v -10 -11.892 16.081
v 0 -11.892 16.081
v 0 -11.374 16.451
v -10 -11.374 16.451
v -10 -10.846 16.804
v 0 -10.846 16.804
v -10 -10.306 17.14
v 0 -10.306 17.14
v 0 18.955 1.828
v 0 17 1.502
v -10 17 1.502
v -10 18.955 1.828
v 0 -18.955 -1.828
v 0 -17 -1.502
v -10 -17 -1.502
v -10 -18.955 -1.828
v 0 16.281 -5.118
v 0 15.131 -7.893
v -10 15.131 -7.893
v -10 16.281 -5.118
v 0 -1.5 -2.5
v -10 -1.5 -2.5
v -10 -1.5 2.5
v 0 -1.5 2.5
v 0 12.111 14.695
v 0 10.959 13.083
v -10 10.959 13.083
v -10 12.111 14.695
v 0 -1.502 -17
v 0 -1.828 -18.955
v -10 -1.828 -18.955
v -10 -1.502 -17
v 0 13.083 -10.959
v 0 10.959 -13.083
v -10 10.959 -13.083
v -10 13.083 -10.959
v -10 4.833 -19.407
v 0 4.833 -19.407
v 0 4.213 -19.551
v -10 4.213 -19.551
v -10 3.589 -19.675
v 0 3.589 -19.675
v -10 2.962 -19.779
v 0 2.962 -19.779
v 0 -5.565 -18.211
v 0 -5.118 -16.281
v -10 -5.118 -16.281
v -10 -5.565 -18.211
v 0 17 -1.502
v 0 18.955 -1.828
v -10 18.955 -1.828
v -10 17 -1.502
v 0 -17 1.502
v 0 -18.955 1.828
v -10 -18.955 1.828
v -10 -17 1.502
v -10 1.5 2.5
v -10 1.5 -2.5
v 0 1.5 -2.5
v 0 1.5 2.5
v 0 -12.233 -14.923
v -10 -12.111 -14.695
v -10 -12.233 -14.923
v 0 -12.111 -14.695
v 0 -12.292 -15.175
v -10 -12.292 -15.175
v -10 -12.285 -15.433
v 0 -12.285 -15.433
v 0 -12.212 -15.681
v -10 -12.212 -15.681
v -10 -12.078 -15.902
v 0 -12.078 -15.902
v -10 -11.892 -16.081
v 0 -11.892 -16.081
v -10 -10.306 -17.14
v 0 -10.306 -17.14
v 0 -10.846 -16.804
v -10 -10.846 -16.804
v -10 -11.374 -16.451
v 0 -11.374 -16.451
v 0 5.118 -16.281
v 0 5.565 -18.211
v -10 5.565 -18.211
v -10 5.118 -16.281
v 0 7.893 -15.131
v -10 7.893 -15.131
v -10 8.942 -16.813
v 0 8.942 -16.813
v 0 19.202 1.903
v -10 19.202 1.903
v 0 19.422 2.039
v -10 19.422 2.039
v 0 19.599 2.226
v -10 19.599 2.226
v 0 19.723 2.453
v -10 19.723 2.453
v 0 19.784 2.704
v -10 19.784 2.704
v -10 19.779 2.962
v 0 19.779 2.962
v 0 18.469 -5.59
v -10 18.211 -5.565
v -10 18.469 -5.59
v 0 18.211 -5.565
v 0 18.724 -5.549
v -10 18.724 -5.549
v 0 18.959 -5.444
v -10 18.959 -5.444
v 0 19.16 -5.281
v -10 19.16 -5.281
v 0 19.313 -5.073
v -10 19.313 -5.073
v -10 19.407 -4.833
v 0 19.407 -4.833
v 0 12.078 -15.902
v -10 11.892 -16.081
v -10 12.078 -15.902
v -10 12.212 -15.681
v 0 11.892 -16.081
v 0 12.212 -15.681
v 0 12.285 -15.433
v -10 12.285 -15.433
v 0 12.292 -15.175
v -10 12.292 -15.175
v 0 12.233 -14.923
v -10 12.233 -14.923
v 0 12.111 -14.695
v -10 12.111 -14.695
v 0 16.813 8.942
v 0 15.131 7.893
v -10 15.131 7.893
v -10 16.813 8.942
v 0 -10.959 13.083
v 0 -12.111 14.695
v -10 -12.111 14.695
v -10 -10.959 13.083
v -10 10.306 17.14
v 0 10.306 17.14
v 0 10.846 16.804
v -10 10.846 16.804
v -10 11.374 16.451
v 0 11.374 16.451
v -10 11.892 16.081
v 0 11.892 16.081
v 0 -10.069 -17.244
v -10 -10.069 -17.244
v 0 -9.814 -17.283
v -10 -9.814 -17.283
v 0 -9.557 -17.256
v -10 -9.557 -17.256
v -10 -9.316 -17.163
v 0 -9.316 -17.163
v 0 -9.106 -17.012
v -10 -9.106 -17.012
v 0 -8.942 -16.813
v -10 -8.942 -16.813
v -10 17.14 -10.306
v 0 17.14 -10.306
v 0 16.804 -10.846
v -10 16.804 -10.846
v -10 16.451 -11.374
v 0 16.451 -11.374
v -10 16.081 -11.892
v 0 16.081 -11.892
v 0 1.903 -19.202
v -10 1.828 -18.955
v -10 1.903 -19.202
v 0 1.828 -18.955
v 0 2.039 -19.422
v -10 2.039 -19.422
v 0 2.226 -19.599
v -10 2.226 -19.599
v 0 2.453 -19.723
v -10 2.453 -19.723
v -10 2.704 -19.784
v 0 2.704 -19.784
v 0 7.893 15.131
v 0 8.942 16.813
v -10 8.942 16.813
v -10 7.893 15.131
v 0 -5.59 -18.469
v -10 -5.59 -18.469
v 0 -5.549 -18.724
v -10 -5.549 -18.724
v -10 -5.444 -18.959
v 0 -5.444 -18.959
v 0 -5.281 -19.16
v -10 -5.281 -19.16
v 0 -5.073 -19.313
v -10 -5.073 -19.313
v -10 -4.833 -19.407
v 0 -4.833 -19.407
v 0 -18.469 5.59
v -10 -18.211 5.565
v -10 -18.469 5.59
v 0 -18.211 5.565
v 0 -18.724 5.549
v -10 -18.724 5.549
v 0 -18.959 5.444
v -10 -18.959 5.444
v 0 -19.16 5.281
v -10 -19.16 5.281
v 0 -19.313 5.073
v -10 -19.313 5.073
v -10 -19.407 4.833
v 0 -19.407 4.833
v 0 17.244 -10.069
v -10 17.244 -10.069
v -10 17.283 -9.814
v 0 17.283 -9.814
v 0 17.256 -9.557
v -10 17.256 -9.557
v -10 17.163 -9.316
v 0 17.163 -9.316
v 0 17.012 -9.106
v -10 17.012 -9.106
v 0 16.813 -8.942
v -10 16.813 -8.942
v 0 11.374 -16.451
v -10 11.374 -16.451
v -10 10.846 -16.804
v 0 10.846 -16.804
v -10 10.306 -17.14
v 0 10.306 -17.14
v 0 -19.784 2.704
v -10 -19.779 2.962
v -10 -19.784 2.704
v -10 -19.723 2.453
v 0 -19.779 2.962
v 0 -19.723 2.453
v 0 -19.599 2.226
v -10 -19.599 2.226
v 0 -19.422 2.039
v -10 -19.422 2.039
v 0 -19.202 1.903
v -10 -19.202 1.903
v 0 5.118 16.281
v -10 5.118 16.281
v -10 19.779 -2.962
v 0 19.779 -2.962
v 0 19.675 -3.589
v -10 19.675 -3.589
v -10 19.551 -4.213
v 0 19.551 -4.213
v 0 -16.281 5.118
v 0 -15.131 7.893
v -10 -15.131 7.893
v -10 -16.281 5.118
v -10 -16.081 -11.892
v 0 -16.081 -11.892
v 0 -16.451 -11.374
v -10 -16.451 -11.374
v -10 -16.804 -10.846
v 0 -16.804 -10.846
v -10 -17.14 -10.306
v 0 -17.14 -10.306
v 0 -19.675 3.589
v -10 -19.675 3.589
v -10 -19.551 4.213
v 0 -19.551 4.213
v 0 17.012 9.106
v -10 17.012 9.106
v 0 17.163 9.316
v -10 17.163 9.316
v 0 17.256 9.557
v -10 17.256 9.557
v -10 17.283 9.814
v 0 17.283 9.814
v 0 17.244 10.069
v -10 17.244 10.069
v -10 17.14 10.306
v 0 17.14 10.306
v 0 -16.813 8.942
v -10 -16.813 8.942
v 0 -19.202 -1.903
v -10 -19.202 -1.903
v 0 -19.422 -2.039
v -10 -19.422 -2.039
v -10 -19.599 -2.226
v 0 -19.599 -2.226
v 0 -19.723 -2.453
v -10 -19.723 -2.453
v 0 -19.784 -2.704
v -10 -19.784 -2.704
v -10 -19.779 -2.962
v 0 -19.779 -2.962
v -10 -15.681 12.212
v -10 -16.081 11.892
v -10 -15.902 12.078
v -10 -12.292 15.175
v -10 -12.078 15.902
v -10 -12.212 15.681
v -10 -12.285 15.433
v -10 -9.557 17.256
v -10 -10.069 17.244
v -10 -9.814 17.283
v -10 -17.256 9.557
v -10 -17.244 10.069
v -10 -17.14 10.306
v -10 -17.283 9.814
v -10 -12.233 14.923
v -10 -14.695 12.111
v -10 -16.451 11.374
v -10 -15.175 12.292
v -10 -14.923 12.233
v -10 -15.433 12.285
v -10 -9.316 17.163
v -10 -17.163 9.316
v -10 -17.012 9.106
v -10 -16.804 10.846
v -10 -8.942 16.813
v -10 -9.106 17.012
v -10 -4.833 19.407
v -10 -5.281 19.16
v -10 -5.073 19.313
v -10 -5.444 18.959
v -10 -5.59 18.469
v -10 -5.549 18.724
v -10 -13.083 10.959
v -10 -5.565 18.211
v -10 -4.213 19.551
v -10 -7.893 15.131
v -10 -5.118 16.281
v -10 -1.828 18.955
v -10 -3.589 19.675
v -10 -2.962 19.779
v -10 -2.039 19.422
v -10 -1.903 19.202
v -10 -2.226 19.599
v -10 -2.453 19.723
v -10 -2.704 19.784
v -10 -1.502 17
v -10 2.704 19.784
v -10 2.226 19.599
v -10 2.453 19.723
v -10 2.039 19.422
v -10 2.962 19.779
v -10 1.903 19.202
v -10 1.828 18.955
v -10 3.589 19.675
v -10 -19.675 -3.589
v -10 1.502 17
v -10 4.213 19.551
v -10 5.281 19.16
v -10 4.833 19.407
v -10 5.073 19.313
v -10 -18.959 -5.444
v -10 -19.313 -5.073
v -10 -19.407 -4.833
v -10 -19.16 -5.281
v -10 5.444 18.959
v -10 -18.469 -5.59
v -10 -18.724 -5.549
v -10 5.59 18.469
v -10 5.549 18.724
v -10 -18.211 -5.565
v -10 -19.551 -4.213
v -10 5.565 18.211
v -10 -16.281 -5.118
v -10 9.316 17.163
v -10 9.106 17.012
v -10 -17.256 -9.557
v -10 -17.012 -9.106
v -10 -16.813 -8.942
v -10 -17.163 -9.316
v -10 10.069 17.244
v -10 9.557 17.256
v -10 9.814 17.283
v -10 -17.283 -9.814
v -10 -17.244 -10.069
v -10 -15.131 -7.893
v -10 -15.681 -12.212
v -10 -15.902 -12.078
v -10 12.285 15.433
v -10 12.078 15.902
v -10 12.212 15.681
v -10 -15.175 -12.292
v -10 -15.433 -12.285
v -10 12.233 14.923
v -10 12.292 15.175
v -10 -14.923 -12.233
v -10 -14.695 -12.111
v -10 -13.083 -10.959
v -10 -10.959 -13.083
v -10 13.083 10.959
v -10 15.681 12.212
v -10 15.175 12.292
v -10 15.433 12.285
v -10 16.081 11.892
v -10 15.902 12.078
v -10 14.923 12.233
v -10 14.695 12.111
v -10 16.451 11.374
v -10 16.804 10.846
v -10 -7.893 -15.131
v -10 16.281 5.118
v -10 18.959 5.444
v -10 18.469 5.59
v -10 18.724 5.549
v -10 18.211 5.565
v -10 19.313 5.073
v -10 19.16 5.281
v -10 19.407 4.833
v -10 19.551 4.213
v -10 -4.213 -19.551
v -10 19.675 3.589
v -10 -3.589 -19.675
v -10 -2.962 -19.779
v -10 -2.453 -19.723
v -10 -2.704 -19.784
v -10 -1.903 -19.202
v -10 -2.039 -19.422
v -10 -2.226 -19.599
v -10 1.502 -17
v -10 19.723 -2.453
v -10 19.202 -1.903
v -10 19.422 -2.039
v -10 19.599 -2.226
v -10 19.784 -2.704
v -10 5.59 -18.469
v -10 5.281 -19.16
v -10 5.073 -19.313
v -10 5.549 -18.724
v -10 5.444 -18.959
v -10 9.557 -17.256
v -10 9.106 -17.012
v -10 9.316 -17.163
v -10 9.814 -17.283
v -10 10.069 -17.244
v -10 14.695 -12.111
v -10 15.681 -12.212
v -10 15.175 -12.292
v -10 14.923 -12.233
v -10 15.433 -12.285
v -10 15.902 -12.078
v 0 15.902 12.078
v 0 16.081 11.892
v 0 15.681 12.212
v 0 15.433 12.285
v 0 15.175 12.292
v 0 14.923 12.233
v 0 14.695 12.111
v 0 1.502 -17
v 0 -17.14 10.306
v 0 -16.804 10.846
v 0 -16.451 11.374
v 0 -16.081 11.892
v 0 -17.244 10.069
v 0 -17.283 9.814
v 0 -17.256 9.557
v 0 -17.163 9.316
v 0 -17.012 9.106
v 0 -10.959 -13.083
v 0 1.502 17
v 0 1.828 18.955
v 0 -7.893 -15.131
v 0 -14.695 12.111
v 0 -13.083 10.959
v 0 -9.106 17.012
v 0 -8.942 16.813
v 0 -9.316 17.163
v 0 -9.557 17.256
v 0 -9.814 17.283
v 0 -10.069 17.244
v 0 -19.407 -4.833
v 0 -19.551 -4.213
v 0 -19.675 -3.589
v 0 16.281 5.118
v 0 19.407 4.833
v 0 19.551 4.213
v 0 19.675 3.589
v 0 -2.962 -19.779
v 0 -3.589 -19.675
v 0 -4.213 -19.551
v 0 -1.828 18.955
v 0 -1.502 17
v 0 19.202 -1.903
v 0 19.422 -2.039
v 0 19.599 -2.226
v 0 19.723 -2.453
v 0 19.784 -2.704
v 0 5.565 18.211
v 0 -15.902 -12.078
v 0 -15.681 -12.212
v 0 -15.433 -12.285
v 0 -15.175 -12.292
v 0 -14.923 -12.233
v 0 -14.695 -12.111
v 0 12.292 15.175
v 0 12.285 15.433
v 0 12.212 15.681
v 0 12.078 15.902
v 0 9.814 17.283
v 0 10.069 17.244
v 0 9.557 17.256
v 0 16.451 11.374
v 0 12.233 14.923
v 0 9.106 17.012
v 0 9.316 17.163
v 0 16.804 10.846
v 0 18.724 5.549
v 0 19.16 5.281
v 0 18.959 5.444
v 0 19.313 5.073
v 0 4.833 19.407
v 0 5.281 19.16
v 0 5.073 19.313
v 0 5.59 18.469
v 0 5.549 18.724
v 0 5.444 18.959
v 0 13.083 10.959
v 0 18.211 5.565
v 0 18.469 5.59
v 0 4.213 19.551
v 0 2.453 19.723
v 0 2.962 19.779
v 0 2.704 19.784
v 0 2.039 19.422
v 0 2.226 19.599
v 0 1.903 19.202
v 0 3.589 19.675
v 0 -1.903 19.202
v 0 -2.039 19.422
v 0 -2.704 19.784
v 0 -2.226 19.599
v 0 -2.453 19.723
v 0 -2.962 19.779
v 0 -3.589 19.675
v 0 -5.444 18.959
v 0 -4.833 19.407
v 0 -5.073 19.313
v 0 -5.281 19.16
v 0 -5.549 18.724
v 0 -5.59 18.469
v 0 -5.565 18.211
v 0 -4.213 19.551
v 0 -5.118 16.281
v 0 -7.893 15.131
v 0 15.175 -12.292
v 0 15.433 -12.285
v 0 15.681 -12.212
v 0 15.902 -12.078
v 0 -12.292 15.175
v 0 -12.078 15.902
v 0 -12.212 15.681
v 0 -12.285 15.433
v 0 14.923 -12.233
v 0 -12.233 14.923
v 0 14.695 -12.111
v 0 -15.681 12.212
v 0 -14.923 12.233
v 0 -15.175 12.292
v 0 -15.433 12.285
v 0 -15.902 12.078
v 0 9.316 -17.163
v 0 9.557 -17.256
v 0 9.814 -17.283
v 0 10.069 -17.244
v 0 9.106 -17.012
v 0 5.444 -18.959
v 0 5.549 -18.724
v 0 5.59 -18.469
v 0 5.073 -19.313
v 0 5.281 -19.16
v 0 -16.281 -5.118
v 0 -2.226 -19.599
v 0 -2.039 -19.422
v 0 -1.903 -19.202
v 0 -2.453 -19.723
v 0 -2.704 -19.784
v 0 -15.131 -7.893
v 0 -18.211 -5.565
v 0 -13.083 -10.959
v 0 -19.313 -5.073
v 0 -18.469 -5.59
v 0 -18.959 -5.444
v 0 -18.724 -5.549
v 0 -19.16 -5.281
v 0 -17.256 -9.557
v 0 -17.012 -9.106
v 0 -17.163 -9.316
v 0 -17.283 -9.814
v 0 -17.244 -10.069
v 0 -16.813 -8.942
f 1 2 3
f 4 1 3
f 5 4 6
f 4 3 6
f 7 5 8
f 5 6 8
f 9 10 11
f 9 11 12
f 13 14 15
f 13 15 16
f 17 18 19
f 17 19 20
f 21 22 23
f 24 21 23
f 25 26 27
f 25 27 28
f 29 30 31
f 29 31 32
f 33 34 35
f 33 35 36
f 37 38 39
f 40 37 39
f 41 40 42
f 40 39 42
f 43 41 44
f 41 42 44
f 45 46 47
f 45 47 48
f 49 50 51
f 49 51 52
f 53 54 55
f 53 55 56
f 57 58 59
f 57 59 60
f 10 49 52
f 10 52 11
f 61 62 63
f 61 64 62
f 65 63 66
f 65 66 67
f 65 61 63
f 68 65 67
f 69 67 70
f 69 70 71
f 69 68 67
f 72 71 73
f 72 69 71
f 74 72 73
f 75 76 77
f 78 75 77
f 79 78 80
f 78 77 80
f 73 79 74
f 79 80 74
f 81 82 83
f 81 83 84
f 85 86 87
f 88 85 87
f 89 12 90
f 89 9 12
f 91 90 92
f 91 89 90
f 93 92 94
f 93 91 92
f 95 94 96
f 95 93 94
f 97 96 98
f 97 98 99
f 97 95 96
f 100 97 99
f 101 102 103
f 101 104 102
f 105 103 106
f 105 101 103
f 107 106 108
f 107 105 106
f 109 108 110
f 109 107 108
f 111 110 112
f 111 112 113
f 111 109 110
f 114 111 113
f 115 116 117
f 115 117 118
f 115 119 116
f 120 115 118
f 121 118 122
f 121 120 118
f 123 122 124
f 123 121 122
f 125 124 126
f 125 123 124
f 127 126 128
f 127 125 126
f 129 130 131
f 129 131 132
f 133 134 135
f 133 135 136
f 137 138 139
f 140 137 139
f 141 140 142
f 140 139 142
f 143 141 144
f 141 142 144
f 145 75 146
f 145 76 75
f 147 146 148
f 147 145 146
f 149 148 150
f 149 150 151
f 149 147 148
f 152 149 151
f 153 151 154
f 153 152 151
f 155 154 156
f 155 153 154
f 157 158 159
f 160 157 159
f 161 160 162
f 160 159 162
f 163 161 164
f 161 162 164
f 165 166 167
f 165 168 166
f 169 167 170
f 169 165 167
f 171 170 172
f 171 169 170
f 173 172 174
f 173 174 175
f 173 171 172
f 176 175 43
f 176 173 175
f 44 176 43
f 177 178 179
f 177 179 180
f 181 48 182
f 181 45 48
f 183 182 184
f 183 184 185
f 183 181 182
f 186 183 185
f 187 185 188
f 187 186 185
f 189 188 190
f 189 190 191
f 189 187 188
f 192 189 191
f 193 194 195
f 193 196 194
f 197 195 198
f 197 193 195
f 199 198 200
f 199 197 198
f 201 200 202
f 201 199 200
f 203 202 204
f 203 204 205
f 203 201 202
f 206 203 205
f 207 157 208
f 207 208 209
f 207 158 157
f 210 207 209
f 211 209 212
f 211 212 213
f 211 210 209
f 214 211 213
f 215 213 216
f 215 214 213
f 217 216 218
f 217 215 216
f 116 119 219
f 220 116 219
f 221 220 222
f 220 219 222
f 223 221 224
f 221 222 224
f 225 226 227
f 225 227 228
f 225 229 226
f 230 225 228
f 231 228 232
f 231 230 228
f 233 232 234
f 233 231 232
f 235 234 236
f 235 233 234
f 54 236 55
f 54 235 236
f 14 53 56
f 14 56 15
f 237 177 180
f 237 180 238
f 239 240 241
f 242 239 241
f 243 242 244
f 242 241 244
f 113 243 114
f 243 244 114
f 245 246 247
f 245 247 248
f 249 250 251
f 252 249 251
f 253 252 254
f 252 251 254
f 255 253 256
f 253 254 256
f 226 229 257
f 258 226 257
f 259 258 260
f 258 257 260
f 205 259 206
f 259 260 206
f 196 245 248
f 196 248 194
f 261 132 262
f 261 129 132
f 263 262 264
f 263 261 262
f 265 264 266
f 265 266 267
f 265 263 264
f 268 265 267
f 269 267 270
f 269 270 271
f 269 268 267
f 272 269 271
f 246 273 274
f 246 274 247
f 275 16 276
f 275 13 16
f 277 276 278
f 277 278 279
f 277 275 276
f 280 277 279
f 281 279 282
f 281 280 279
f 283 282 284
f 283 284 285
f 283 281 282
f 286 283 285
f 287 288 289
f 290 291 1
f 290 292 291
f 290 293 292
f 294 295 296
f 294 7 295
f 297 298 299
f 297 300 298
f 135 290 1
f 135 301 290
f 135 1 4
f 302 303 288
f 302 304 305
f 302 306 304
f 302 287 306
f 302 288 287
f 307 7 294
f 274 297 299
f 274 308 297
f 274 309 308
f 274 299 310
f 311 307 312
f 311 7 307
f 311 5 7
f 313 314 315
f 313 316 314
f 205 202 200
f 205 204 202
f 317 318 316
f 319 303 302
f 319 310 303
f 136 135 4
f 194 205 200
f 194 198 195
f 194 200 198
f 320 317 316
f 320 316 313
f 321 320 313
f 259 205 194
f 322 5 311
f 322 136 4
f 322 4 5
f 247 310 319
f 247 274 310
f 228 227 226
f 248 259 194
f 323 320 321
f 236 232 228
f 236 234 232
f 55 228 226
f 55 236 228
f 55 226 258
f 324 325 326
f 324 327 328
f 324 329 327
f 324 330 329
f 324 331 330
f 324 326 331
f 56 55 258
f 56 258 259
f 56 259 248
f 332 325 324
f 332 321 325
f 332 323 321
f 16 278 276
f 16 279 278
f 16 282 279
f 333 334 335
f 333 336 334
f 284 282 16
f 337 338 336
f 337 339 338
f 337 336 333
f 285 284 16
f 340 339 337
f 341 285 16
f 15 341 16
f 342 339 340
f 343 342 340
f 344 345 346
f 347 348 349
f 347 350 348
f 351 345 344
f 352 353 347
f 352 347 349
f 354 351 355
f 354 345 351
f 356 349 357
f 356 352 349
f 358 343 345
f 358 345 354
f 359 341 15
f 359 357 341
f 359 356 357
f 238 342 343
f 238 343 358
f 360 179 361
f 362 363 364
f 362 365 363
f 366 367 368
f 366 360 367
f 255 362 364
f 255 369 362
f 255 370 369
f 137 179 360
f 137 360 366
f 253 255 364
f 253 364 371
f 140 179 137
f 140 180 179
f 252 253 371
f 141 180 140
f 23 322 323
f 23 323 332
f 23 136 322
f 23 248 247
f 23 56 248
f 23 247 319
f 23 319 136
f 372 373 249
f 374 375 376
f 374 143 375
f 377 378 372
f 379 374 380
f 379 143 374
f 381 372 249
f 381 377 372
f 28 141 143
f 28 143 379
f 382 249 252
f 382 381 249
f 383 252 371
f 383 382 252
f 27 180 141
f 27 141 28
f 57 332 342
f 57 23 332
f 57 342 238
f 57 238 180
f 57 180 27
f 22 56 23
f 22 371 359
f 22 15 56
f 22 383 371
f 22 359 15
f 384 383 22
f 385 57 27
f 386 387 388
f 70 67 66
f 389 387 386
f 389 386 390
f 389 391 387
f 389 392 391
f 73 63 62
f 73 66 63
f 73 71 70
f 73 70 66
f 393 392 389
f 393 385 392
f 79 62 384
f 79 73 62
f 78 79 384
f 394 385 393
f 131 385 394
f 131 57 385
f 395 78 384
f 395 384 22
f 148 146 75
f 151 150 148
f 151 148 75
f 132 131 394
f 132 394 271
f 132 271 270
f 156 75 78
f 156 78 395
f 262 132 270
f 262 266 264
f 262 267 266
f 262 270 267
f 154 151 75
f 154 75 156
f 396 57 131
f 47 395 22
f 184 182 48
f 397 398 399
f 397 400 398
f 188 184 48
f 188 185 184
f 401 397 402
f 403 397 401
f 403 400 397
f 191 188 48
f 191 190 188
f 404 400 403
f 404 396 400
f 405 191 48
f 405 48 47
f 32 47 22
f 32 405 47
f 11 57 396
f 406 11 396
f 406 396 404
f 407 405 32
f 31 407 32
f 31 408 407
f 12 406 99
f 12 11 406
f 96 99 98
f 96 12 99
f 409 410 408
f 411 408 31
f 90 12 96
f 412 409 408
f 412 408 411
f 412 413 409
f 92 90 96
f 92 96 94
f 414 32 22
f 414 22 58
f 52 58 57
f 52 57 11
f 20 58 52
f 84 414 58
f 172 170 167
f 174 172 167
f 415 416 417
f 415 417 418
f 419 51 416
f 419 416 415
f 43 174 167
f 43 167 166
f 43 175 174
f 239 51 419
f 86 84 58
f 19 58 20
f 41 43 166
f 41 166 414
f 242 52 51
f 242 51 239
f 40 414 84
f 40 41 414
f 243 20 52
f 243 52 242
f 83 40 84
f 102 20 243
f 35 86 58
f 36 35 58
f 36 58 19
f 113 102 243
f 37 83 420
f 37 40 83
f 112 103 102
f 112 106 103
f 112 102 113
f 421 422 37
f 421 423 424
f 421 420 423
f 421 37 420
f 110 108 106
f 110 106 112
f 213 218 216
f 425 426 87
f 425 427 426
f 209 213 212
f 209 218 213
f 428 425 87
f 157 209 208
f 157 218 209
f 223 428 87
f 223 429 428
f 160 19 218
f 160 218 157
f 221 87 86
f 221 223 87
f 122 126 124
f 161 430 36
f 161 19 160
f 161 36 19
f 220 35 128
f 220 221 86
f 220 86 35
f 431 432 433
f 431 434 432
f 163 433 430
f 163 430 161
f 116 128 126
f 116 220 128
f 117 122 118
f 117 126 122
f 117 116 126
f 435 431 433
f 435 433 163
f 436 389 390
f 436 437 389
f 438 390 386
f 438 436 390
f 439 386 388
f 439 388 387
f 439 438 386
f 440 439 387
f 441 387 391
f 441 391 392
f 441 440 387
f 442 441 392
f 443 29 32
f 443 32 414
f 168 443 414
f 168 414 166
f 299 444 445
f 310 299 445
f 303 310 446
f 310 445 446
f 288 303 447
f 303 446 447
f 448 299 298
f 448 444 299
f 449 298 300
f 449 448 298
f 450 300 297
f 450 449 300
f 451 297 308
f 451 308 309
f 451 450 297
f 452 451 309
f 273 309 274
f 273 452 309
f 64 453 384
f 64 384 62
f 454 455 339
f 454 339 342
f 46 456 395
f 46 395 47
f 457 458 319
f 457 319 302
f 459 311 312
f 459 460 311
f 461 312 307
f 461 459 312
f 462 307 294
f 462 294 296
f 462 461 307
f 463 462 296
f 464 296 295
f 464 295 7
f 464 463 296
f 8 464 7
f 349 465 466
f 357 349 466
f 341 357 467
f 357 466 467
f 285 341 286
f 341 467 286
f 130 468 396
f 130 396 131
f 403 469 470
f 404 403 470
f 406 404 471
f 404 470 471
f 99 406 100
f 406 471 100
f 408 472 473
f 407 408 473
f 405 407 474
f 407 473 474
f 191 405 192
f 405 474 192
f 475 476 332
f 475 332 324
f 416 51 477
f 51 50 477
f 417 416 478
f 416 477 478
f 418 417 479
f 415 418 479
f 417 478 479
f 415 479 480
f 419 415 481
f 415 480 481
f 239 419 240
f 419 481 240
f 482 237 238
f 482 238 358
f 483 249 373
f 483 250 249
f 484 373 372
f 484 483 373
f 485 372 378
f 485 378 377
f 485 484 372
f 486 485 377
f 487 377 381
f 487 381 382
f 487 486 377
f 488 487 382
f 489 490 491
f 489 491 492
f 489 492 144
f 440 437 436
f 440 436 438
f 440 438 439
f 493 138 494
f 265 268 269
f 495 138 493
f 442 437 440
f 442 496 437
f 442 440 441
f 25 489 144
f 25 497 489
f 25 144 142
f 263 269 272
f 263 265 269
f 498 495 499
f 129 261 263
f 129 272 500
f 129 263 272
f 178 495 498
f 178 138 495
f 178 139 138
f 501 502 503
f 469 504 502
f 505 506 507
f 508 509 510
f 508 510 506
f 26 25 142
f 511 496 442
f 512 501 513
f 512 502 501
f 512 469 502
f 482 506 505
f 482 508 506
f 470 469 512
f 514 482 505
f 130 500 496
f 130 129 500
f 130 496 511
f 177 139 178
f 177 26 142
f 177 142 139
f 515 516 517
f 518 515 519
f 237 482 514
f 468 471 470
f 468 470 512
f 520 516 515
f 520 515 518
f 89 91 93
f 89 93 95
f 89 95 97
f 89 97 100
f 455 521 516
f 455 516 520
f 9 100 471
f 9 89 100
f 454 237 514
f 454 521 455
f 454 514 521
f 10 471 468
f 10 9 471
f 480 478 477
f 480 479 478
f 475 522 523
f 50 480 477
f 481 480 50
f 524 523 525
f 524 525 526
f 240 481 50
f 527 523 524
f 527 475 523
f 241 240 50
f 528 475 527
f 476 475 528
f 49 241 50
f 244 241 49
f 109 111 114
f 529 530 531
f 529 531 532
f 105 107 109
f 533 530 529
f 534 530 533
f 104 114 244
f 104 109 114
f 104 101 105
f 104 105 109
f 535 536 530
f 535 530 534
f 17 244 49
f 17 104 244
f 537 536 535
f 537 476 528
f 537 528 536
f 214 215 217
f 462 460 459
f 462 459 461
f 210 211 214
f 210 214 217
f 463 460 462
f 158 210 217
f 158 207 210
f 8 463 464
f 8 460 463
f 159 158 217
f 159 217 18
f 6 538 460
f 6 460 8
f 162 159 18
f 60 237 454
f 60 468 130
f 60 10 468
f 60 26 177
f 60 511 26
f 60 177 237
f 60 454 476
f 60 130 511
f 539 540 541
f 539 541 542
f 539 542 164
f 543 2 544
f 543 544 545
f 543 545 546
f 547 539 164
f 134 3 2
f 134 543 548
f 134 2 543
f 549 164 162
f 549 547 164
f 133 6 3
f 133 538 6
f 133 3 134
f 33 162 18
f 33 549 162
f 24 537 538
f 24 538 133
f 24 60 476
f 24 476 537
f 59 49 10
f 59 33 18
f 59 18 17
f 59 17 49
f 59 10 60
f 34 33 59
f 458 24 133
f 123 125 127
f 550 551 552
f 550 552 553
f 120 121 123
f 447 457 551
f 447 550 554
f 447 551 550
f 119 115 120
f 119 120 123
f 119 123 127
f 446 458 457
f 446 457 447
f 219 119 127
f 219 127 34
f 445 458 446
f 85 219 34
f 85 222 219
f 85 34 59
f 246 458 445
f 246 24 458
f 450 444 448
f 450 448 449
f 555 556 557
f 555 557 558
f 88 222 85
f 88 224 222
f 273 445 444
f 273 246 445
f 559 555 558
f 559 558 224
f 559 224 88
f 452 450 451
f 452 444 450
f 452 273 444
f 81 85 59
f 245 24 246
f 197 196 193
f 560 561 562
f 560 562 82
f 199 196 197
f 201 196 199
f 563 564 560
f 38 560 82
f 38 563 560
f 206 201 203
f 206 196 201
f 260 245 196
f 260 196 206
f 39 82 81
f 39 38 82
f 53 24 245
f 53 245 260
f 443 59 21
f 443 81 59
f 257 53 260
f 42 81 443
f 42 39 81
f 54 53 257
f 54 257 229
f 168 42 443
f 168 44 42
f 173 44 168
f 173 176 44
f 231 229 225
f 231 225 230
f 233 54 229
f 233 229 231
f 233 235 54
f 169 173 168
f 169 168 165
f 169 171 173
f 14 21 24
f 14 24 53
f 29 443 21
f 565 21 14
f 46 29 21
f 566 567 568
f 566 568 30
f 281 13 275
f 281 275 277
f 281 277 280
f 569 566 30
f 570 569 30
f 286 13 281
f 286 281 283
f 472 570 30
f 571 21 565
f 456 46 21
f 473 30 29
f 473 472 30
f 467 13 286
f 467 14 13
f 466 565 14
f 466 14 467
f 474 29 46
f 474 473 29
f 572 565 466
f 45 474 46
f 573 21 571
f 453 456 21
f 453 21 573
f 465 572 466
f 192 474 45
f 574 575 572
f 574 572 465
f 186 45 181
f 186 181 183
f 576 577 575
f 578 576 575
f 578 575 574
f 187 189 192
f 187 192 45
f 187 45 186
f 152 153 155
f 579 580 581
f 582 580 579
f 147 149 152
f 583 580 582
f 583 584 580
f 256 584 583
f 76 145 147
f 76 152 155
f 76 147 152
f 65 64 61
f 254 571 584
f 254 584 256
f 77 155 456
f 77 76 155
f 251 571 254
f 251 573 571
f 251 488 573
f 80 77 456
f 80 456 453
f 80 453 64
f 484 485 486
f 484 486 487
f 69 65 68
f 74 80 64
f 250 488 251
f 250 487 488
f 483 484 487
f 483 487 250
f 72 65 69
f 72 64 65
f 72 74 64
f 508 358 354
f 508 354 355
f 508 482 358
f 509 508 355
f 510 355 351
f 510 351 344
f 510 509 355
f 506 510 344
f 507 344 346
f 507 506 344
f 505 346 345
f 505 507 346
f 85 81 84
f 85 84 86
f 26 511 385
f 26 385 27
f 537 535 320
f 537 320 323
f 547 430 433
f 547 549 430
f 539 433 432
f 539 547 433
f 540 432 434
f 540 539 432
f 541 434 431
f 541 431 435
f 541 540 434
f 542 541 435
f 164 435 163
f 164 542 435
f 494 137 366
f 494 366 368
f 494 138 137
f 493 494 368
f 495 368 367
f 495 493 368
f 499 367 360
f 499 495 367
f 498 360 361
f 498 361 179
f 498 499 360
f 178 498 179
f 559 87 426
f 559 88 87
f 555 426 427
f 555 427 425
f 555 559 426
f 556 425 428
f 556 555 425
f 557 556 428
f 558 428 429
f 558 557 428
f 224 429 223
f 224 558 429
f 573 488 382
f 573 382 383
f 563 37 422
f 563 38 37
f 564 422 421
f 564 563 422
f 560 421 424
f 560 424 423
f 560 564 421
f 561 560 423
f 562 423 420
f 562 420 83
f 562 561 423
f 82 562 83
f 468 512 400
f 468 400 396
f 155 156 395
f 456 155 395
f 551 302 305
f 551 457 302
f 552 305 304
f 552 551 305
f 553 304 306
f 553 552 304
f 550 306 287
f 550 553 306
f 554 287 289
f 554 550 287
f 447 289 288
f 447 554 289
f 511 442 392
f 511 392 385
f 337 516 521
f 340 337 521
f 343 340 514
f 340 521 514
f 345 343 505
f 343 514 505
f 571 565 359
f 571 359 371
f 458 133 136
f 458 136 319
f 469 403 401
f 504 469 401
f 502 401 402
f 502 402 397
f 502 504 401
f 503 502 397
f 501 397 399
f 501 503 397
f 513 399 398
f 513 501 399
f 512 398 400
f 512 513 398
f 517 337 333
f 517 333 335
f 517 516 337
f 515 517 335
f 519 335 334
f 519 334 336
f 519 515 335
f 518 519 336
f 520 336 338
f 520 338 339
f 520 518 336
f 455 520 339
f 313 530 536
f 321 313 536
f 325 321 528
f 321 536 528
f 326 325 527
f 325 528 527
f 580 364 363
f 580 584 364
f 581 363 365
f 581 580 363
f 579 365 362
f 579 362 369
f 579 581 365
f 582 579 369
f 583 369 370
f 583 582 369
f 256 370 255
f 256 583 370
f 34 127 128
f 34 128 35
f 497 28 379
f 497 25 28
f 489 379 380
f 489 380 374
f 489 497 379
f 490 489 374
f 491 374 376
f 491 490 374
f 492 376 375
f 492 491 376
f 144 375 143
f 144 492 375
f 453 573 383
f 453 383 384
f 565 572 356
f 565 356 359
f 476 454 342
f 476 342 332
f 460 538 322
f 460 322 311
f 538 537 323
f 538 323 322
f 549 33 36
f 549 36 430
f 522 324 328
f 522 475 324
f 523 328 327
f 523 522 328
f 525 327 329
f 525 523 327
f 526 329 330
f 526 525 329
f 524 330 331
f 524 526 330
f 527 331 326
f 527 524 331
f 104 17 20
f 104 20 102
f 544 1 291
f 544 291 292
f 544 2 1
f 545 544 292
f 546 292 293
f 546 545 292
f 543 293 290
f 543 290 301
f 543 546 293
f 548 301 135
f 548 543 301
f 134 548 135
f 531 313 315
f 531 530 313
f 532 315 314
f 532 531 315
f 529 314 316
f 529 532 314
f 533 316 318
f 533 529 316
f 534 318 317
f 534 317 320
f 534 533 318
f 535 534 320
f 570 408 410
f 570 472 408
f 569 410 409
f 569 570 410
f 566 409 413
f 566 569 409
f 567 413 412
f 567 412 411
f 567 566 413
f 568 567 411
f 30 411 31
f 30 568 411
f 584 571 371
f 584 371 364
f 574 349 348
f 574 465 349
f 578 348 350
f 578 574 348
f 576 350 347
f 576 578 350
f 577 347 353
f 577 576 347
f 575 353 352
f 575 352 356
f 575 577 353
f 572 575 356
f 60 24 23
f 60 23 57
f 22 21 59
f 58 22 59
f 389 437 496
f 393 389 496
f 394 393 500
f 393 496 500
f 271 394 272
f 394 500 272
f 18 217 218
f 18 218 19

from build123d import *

# Parameters (mm, degrees)
SKETCH4_W                = 5
SKETCH4_H                = 3
CUT_EXTRUDE2_DEPTH       = 10
CUT_EXTRUDE3_DEPTH       = 10
FILLET1_R                = 1
CIRPATTERN1_COUNT        = 16
FILLET1_OF_CIRPATTERN1_R = 1


with BuildPart() as part:
    # Sketch1 → Revolve1 (revolve)
    with BuildSketch(Plane.XY):
        Polygon((0, 0), (-10, 0), (-10, 5), (-10, 10), (-10, 20), (0, 20), (0, 5), align=None)
    revolve(axis=Axis((0, 0, 0), (-1, 0, 0)))

    # Sketch4 → Cut-Extrude2 (cut)
    with BuildSketch(Plane.ZY.offset(10)):
        Rectangle(SKETCH4_W, SKETCH4_H)
    extrude(amount=-CUT_EXTRUDE2_DEPTH, mode=Mode.SUBTRACT)

    # Sketch5 → Cut-Extrude3 (cut)
    with BuildSketch(Plane(origin=(0, 0, 0), x_dir=(0, 0, -1), z_dir=(1, 0, 0))):
        Polygon((-2.502016427, 23), (2.502016427, 23), (1.501758676, 17), (-1.501758676, 17), align=None)
    cut_extrude3 = extrude(amount=-CUT_EXTRUDE3_DEPTH, mode=Mode.SUBTRACT)

    # Fillet1
    fillet1_edges = [part.edges().sort_by_distance(p)[0] for p in [
        (-5, 19.90120888, -1.985418121),
        (-5, 19.90120888, 1.985418121),
    ]]
    fillet(fillet1_edges, radius=FILLET1_R)

    # CirPattern1: Cut-Extrude3 ×16 about axis
    cirpattern1_axis = Axis((0, 0, 0), (1, 0, 0))
    for i in range(1, CIRPATTERN1_COUNT):
        add(cut_extrude3.rotate(cirpattern1_axis, i * 360 / CIRPATTERN1_COUNT), mode=Mode.SUBTRACT)

    # Fillet1 of CirPattern1
    fillet1_of_cirpattern1_edges = [part.edges().sort_by_distance(p)[0] for p in [
        (-5, 19.146106178, 5.781575757),
        (-5, 17.626532935, 9.450150088),
        (-5, 15.47618237, 12.668377136),
        (-5, 12.668377136, 15.47618237),
        (-5, 9.450150088, 17.626532935),
        (-5, 5.781575757, 19.146106178),
        (-5, 1.985418121, 19.90120888),
        (-5, -1.985418121, 19.90120888),
        (-5, -5.781575757, 19.146106178),
        (-5, -9.450150088, 17.626532935),
        (-5, -12.668377136, 15.47618237),
        (-5, -15.47618237, 12.668377136),
        (-5, -17.626532935, 9.450150088),
        (-5, -19.146106178, 5.781575757),
        (-5, -19.90120888, 1.985418121),
        (-5, -19.90120888, -1.985418121),
        (-5, -19.146106178, -5.781575757),
        (-5, -17.626532935, -9.450150088),
        (-5, -15.47618237, -12.668377136),
        (-5, -12.668377136, -15.47618237),
        (-5, -9.450150088, -17.626532935),
        (-5, -5.781575757, -19.146106178),
        (-5, -1.985418121, -19.90120888),
        (-5, 1.985418121, -19.90120888),
        (-5, 5.781575757, -19.146106178),
        (-5, 9.450150088, -17.626532935),
        (-5, 12.668377136, -15.47618237),
        (-5, 15.47618237, -12.668377136),
        (-5, 17.626532935, -9.450150088),
        (-5, 19.146106178, -5.781575757),
    ]]
    fillet(fillet1_of_cirpattern1_edges, radius=FILLET1_OF_CIRPATTERN1_R)


solid = part.part
